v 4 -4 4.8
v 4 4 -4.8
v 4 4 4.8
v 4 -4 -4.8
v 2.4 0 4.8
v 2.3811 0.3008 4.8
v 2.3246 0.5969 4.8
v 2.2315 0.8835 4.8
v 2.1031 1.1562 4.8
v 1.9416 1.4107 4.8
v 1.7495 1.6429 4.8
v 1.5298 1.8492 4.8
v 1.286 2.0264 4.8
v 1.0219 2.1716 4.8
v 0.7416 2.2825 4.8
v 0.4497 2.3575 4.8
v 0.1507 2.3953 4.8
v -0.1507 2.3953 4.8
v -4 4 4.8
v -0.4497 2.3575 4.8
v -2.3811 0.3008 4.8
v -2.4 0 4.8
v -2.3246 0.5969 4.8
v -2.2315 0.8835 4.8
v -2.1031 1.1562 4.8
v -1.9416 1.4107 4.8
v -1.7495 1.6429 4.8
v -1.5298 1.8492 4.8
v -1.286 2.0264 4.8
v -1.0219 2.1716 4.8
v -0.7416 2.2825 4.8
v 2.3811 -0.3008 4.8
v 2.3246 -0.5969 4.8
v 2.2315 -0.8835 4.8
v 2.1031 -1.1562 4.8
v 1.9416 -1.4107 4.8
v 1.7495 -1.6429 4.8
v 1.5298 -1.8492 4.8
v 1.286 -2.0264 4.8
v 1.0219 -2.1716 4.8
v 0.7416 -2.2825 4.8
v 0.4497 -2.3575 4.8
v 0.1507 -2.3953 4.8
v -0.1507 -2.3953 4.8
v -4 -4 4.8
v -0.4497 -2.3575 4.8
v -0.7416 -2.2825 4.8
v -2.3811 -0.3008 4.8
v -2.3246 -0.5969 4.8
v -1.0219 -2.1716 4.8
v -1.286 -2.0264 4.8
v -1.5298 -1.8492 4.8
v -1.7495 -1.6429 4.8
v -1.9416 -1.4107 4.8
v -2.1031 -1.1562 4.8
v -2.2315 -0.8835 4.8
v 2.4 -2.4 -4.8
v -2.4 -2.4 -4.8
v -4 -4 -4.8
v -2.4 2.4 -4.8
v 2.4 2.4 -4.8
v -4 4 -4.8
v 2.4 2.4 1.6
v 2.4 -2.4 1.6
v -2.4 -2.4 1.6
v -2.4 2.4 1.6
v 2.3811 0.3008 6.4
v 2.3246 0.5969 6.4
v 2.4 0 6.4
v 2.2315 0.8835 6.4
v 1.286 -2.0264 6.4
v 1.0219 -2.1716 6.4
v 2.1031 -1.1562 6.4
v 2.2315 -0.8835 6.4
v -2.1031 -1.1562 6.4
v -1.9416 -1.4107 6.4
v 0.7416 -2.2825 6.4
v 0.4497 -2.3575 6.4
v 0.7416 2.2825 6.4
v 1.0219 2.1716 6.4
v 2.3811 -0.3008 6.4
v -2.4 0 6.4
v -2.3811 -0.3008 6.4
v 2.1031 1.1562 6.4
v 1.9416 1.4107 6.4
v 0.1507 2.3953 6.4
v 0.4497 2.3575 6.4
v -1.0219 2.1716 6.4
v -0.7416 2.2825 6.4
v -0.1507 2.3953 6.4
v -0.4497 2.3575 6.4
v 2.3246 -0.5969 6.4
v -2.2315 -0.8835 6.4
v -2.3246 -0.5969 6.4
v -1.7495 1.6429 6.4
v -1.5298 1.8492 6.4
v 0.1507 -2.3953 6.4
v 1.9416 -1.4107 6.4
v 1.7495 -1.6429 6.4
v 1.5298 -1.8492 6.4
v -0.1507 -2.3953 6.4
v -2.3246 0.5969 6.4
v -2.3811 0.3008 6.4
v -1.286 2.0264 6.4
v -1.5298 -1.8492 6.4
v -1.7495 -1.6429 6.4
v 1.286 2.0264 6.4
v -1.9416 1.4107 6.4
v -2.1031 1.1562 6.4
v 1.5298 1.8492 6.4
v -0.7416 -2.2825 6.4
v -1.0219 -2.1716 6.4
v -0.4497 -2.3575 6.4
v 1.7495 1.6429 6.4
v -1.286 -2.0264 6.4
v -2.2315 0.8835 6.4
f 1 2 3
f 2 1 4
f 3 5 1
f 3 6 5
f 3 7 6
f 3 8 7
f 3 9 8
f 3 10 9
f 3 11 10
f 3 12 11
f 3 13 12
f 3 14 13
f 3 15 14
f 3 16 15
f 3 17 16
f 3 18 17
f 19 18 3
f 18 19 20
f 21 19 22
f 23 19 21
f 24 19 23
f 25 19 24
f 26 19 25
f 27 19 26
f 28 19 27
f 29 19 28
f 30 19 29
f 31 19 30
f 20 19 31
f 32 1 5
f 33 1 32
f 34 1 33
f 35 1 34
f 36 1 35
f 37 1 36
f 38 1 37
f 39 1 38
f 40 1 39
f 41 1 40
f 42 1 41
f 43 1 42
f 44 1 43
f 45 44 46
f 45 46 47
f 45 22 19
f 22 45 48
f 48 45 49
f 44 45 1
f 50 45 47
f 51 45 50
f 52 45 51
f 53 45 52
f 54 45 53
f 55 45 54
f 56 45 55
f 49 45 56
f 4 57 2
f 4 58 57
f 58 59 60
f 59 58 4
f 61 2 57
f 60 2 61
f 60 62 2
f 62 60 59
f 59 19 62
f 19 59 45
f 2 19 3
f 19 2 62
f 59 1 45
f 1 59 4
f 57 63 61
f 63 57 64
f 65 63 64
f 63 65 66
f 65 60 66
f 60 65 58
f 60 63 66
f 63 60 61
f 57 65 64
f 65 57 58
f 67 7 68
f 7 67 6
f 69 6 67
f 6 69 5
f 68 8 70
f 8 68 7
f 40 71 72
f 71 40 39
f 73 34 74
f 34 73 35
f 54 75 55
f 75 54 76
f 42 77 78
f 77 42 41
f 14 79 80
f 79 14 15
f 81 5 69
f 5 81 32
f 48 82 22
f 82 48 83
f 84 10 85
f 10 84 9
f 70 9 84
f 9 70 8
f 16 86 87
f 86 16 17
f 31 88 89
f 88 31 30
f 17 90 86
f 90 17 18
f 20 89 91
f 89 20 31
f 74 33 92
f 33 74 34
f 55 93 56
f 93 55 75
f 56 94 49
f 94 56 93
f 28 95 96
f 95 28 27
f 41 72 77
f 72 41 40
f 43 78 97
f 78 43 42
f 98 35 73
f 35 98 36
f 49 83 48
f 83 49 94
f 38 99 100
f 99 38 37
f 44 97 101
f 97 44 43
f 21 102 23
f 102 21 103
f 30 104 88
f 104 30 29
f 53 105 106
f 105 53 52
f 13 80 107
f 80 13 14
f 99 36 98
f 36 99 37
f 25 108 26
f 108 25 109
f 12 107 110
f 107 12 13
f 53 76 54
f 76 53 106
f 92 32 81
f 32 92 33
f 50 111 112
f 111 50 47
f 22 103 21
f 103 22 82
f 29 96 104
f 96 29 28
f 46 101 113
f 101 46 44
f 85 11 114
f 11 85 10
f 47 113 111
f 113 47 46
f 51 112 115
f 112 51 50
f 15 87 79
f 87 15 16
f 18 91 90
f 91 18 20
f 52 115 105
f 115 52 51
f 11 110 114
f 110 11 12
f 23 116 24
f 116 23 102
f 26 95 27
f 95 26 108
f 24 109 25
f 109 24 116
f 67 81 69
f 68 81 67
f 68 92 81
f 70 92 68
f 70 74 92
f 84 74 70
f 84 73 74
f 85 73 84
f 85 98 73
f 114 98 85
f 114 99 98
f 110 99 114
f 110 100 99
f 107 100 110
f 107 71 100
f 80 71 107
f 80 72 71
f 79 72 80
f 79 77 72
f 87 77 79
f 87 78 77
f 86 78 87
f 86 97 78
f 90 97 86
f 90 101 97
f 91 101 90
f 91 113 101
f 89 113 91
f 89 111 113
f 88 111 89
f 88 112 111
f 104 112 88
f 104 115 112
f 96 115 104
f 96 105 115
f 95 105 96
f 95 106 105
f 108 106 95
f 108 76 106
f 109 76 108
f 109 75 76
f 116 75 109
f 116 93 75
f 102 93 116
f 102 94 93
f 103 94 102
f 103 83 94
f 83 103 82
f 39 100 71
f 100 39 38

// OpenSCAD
$fn = 50;

union () {
    difference() {
        cube([8, 8, 9.6], center=true);
        translate([0, 0, -3.2]) {
         cube([4.8, 4.8, 3.2*3], center=true);
        }
    }
    translate([0,0,9.6/2]) {
       cylinder(d=4.8, h=1.6*2, center=true);
    }
}
